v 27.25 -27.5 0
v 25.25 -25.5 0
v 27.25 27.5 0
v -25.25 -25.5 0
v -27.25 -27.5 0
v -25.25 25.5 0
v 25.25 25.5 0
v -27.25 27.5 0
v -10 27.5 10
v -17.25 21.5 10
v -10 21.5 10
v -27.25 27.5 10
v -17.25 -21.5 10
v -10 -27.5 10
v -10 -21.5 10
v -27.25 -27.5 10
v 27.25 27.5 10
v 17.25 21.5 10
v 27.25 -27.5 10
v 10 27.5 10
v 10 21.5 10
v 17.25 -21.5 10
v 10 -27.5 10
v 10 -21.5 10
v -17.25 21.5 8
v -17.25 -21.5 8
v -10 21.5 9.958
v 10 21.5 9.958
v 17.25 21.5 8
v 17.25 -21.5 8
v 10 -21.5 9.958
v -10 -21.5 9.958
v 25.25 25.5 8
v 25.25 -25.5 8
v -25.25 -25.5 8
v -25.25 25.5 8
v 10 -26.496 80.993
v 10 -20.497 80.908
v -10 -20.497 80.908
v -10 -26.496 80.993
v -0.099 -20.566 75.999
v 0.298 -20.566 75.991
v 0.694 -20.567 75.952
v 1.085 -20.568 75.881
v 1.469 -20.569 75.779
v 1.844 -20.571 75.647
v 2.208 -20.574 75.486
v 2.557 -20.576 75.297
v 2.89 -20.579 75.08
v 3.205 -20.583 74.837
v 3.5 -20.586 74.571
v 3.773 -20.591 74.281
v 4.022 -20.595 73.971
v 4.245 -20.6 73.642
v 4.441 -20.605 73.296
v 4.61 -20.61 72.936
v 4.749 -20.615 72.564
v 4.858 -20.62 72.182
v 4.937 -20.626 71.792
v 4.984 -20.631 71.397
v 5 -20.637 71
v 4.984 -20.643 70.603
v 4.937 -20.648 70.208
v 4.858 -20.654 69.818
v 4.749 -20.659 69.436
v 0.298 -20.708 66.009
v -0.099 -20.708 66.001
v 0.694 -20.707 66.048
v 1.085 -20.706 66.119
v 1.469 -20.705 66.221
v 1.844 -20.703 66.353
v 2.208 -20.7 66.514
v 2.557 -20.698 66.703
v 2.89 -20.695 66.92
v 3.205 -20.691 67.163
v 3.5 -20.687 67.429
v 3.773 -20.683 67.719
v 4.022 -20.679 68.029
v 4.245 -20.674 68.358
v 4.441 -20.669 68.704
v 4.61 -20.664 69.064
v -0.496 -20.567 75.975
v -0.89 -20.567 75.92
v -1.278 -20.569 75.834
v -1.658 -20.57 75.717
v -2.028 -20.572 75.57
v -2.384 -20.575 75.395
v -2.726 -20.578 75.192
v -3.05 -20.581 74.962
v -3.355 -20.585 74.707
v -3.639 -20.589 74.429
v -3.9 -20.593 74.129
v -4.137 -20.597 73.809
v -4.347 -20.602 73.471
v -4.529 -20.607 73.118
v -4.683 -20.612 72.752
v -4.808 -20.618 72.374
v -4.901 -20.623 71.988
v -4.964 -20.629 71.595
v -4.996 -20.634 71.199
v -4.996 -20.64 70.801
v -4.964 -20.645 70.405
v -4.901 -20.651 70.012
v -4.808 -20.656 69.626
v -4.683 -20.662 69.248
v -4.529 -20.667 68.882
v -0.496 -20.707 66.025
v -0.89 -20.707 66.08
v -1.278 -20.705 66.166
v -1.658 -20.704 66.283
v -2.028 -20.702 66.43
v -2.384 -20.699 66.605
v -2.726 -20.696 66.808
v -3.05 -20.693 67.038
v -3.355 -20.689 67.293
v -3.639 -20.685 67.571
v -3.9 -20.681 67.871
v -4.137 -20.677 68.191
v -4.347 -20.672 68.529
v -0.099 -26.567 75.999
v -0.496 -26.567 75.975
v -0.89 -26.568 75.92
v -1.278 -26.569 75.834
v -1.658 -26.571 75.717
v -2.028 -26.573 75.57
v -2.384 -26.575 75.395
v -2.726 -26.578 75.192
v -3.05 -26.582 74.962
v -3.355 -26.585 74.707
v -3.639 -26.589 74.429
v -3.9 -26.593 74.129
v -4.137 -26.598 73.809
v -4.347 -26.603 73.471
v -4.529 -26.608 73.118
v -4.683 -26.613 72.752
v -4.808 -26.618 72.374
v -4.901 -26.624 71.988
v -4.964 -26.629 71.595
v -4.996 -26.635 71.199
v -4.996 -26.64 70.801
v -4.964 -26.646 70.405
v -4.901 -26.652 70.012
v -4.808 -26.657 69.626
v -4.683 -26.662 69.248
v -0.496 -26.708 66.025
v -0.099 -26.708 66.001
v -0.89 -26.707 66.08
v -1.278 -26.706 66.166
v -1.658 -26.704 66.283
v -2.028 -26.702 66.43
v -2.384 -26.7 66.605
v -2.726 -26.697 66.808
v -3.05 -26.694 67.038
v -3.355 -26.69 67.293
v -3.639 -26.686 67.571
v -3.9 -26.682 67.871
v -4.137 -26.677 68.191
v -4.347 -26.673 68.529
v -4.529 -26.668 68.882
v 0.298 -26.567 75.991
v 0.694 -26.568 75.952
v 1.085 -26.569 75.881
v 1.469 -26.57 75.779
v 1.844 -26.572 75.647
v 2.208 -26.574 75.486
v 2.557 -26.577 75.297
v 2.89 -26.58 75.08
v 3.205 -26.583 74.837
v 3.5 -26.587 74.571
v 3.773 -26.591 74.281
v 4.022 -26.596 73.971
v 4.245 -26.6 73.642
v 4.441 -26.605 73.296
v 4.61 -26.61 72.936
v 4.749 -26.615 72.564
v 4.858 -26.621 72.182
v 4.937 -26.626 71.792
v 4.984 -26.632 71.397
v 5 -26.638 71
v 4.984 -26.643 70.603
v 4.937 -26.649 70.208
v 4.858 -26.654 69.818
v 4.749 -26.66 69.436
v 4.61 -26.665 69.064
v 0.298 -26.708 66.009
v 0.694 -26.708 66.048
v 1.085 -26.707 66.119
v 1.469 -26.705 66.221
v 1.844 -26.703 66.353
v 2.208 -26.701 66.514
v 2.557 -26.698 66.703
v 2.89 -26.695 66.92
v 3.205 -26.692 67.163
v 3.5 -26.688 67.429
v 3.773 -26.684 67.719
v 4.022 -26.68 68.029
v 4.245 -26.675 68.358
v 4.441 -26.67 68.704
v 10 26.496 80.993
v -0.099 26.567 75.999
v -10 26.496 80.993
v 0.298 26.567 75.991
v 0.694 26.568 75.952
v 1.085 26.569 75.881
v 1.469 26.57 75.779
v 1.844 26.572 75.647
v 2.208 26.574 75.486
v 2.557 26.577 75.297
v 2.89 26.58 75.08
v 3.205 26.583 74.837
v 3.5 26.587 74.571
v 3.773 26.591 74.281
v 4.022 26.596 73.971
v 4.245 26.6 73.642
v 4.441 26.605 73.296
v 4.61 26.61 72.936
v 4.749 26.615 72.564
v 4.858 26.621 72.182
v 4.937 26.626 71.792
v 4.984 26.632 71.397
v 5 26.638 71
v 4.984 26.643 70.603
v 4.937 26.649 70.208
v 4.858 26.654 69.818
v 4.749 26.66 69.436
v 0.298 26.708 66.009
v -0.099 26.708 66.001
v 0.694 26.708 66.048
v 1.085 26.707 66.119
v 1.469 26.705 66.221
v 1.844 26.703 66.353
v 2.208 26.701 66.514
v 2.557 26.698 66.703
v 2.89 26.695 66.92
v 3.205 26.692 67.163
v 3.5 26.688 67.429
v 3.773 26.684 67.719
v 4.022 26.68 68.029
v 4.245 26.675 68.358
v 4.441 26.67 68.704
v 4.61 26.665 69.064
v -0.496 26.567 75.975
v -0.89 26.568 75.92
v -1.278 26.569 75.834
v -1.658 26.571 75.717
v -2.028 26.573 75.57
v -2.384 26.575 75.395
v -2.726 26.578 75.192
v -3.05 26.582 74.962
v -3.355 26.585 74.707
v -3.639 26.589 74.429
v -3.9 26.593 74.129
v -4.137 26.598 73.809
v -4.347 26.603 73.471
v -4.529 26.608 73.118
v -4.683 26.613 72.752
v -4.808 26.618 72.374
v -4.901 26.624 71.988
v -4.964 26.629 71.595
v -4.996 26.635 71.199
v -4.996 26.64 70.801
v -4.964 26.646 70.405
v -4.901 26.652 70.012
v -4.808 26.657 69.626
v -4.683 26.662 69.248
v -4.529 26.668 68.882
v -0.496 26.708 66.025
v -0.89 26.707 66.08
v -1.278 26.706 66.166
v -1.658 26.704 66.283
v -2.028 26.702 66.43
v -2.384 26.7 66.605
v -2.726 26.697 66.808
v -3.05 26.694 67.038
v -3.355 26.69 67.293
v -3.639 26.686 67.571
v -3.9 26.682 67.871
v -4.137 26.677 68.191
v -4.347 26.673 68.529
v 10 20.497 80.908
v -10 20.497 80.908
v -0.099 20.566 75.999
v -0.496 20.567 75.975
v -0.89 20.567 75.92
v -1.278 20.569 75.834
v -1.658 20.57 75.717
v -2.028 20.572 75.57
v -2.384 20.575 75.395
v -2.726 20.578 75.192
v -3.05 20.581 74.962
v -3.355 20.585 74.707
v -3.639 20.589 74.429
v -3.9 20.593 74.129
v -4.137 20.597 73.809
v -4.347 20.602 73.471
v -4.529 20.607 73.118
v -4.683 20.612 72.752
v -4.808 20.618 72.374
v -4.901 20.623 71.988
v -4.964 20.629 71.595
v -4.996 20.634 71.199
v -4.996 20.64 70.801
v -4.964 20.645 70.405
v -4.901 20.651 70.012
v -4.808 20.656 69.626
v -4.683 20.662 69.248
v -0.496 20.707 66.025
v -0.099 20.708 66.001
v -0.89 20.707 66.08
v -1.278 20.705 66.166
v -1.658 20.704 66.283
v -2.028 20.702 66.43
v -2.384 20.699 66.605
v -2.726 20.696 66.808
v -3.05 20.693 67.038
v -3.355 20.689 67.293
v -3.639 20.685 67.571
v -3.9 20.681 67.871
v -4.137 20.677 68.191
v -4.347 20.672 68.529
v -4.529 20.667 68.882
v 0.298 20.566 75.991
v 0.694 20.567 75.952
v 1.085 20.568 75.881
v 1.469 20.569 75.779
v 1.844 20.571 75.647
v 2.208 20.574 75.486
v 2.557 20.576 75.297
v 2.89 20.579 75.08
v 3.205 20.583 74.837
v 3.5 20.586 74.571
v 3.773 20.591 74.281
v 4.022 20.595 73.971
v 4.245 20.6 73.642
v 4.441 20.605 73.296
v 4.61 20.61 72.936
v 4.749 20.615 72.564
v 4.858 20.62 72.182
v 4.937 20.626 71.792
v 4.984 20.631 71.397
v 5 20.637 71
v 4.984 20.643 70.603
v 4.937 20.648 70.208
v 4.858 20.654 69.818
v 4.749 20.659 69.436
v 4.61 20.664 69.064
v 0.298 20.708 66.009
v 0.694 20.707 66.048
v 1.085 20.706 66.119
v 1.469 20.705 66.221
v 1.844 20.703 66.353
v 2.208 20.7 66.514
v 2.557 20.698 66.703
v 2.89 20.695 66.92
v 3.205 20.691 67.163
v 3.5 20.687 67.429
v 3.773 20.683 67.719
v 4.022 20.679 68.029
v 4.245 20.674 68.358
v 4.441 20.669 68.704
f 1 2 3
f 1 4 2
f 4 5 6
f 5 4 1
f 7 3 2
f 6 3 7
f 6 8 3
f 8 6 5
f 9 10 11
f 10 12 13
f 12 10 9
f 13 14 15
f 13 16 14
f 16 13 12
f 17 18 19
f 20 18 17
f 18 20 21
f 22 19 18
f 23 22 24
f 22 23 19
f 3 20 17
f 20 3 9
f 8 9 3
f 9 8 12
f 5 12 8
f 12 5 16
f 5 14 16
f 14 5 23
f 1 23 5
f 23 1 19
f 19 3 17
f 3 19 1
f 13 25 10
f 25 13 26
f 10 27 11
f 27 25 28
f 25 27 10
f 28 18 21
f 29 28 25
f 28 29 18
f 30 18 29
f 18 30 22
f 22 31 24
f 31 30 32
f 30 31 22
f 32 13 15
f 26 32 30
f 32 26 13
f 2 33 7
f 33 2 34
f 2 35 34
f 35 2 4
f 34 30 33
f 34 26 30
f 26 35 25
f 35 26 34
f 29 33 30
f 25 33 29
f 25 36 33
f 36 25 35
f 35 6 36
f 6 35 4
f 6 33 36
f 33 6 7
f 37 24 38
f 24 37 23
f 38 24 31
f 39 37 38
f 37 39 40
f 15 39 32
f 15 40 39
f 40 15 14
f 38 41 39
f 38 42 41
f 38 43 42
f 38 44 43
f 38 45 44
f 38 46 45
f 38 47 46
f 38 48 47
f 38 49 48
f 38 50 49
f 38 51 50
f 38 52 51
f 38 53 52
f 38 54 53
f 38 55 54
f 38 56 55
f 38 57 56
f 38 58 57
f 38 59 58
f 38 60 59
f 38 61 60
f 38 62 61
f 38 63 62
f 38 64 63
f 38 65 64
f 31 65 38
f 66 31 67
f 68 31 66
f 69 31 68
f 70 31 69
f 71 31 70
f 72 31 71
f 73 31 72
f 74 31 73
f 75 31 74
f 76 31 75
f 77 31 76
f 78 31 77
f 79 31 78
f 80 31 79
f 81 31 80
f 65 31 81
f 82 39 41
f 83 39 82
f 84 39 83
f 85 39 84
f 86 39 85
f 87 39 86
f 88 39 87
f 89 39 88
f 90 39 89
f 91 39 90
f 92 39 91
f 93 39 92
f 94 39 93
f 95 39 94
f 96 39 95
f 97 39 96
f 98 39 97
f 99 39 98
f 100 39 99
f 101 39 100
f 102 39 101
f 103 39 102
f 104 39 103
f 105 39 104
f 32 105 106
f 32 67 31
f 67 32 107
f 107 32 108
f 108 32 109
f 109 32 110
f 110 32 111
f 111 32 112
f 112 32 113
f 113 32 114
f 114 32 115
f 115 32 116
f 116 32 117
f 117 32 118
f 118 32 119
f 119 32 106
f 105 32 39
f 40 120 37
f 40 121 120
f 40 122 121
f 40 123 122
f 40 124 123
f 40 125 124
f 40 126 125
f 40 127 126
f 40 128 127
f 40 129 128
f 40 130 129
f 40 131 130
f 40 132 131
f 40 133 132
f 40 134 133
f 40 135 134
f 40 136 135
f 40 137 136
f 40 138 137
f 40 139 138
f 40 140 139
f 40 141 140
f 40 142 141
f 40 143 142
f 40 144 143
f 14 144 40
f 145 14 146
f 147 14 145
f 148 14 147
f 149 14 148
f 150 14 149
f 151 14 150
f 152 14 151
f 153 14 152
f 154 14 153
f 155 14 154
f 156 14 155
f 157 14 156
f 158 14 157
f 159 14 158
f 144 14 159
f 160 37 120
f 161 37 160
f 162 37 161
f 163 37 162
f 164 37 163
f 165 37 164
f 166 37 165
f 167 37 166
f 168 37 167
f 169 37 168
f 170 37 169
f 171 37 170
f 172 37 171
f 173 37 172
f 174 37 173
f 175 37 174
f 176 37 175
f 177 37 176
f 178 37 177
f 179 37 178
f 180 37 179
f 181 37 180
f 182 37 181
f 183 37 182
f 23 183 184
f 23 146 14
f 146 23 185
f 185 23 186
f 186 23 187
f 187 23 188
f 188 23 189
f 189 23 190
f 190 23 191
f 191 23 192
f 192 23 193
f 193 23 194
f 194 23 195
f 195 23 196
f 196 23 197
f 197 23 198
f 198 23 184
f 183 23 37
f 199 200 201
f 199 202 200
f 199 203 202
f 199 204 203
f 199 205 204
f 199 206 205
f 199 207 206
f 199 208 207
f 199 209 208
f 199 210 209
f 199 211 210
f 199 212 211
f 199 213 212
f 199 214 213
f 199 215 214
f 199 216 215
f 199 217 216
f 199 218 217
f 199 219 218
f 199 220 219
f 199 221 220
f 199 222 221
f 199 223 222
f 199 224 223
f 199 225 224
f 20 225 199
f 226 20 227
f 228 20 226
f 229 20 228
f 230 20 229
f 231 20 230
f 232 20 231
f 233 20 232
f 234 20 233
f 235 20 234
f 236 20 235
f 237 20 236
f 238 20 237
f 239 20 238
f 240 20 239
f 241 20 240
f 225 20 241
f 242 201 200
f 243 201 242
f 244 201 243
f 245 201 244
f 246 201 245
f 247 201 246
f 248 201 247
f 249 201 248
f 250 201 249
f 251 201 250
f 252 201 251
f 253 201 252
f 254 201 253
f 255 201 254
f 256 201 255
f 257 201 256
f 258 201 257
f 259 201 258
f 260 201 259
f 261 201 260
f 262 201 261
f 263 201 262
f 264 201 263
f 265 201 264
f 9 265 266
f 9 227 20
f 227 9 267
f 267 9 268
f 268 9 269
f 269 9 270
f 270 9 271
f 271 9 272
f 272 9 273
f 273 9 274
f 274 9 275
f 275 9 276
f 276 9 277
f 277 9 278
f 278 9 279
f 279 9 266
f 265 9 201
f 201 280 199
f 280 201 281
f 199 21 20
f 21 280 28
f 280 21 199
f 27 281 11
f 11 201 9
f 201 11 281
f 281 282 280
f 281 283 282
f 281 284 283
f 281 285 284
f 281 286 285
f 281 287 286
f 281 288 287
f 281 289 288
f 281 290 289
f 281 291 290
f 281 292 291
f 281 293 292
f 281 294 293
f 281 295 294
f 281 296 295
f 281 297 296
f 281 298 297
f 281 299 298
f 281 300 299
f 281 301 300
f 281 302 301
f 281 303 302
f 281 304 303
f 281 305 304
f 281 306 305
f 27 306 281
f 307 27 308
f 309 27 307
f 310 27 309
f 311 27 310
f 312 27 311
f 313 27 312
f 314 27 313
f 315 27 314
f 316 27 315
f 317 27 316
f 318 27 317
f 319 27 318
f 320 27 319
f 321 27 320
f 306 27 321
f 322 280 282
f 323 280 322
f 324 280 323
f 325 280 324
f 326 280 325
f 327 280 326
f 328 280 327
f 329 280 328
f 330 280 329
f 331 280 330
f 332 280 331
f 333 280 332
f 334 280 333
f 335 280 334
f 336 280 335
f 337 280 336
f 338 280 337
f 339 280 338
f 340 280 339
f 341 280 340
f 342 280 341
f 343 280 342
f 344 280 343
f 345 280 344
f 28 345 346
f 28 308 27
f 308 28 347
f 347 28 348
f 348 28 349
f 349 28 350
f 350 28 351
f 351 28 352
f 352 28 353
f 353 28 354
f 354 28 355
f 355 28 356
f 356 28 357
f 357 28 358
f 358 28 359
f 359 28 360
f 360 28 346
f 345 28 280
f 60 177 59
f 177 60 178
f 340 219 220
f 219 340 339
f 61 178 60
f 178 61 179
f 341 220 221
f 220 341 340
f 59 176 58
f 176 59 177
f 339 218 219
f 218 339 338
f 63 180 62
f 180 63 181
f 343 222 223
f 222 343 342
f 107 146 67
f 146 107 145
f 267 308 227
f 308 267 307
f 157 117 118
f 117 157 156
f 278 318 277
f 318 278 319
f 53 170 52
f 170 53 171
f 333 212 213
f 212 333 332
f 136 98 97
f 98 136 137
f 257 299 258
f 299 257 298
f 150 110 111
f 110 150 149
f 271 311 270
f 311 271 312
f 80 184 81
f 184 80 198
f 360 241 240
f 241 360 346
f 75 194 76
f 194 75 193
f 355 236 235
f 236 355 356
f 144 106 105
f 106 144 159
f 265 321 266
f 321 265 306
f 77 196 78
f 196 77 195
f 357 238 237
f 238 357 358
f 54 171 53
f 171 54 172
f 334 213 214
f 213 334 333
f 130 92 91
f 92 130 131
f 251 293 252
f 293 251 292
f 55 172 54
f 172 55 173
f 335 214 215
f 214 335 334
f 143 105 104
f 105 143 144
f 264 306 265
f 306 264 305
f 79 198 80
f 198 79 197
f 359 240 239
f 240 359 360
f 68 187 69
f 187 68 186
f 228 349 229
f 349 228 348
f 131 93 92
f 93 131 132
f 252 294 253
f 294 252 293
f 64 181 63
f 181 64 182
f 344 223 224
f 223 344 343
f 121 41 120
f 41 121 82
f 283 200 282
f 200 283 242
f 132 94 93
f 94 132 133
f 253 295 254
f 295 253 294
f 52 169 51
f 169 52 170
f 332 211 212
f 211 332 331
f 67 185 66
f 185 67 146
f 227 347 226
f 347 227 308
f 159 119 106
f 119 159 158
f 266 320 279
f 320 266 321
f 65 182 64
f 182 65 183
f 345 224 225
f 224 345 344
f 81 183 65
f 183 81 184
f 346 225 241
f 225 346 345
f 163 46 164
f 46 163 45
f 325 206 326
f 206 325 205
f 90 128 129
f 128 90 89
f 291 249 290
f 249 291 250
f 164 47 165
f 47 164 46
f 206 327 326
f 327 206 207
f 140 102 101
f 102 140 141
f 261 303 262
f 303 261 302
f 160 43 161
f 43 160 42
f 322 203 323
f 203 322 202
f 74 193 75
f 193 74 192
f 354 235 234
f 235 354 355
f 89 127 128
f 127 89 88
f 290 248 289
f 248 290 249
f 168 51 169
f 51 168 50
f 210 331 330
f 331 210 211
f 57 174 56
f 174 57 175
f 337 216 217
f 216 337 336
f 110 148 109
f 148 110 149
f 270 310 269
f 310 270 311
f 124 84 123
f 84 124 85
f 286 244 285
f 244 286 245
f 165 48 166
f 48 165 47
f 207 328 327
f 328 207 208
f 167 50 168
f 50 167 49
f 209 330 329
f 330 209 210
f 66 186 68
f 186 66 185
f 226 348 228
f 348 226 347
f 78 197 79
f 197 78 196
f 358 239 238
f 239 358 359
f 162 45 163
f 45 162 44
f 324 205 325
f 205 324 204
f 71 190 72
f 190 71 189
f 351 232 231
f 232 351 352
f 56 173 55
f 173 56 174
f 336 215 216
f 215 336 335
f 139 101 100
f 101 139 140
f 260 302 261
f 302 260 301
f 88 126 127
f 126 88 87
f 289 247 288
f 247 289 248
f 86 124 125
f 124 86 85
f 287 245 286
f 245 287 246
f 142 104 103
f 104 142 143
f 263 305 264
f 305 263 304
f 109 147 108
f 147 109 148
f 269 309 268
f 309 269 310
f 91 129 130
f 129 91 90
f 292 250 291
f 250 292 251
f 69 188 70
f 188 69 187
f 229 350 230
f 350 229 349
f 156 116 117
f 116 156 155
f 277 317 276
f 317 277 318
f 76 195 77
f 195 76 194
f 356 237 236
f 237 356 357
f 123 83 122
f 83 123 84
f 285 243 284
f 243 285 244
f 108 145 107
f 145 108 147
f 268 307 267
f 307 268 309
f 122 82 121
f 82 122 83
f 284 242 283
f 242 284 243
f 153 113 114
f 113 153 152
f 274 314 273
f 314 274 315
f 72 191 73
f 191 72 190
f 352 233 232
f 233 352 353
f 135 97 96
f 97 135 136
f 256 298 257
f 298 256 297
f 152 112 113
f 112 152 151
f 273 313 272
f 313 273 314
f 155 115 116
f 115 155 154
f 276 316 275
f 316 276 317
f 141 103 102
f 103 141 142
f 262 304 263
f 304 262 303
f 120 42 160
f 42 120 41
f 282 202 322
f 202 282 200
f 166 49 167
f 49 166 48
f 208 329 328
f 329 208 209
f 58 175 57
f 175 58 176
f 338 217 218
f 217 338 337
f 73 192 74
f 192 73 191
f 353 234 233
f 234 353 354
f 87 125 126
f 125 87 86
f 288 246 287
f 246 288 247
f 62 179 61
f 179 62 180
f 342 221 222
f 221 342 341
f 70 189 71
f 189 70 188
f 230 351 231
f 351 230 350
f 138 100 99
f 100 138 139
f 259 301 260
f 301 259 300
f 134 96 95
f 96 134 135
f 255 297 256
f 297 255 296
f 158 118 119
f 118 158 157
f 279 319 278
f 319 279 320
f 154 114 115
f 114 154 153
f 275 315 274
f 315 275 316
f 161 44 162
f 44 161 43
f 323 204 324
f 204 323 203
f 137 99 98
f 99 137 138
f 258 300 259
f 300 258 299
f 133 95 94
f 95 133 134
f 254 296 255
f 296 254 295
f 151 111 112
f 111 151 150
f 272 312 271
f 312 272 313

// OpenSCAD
/*
 * Ferris wheel base
 * By smkent (GitHub) / bulbasaur0 (Printables)
 *
 * Licensed under Creative Commons (4.0 International License) Attribution-ShareAlike
 */

module __end_customizer_options__() { }

// Constants //

$fa = $preview ? $fa : 2;
$fs = $preview ? $fs / 4 : 0.4;

base_outer = [10 * 2 + 34.5, 55];
base_inner = [34.5, 55 - 6 * 2];
base_height = 10;
base_lip_height = 8;
base_lip_width = 2;

supports_size = [20, 6, 61 + 10];
supports_tilt = 0.81;
supports_placement = 10;

axle_height = 10 + 61;
axle_diameter = 10;

slop = 0.001;

// Modules //

module ferris_wheel_base() {
    render(convexity=4)
    difference() {
        linear_extrude(height=base_height)
        difference() {
            square(base_outer, center=true);
            square(base_inner, center=true);
        }
        translate([0, 0, -slop])
        linear_extrude(height=base_lip_height + slop)
        offset(delta=-base_lip_width)
        square(base_outer, center=true);
    }
}

module ferris_wheel_supports() {
    for (mirror_y = [0, 1])
    mirror([0, mirror_y])
    translate([-supports_size[0] / 2, -base_outer[1] / 2, supports_placement])
    rotate([-supports_tilt, 0, 0])
    cube(supports_size);
}

module ferris_wheel_axle() {
    difference() {
        children();
        translate([0, 0, axle_height])
        rotate([90, 0, 0])
        cylinder(h=base_outer[1] * 2, d=axle_diameter, center=true);
    }
}

module ferris_wheel_stand() {
    ferris_wheel_base();
    ferris_wheel_axle() {
        ferris_wheel_supports();
    }
}

module main() {
    color("gold", 0.9)
    ferris_wheel_stand();
}

main();
